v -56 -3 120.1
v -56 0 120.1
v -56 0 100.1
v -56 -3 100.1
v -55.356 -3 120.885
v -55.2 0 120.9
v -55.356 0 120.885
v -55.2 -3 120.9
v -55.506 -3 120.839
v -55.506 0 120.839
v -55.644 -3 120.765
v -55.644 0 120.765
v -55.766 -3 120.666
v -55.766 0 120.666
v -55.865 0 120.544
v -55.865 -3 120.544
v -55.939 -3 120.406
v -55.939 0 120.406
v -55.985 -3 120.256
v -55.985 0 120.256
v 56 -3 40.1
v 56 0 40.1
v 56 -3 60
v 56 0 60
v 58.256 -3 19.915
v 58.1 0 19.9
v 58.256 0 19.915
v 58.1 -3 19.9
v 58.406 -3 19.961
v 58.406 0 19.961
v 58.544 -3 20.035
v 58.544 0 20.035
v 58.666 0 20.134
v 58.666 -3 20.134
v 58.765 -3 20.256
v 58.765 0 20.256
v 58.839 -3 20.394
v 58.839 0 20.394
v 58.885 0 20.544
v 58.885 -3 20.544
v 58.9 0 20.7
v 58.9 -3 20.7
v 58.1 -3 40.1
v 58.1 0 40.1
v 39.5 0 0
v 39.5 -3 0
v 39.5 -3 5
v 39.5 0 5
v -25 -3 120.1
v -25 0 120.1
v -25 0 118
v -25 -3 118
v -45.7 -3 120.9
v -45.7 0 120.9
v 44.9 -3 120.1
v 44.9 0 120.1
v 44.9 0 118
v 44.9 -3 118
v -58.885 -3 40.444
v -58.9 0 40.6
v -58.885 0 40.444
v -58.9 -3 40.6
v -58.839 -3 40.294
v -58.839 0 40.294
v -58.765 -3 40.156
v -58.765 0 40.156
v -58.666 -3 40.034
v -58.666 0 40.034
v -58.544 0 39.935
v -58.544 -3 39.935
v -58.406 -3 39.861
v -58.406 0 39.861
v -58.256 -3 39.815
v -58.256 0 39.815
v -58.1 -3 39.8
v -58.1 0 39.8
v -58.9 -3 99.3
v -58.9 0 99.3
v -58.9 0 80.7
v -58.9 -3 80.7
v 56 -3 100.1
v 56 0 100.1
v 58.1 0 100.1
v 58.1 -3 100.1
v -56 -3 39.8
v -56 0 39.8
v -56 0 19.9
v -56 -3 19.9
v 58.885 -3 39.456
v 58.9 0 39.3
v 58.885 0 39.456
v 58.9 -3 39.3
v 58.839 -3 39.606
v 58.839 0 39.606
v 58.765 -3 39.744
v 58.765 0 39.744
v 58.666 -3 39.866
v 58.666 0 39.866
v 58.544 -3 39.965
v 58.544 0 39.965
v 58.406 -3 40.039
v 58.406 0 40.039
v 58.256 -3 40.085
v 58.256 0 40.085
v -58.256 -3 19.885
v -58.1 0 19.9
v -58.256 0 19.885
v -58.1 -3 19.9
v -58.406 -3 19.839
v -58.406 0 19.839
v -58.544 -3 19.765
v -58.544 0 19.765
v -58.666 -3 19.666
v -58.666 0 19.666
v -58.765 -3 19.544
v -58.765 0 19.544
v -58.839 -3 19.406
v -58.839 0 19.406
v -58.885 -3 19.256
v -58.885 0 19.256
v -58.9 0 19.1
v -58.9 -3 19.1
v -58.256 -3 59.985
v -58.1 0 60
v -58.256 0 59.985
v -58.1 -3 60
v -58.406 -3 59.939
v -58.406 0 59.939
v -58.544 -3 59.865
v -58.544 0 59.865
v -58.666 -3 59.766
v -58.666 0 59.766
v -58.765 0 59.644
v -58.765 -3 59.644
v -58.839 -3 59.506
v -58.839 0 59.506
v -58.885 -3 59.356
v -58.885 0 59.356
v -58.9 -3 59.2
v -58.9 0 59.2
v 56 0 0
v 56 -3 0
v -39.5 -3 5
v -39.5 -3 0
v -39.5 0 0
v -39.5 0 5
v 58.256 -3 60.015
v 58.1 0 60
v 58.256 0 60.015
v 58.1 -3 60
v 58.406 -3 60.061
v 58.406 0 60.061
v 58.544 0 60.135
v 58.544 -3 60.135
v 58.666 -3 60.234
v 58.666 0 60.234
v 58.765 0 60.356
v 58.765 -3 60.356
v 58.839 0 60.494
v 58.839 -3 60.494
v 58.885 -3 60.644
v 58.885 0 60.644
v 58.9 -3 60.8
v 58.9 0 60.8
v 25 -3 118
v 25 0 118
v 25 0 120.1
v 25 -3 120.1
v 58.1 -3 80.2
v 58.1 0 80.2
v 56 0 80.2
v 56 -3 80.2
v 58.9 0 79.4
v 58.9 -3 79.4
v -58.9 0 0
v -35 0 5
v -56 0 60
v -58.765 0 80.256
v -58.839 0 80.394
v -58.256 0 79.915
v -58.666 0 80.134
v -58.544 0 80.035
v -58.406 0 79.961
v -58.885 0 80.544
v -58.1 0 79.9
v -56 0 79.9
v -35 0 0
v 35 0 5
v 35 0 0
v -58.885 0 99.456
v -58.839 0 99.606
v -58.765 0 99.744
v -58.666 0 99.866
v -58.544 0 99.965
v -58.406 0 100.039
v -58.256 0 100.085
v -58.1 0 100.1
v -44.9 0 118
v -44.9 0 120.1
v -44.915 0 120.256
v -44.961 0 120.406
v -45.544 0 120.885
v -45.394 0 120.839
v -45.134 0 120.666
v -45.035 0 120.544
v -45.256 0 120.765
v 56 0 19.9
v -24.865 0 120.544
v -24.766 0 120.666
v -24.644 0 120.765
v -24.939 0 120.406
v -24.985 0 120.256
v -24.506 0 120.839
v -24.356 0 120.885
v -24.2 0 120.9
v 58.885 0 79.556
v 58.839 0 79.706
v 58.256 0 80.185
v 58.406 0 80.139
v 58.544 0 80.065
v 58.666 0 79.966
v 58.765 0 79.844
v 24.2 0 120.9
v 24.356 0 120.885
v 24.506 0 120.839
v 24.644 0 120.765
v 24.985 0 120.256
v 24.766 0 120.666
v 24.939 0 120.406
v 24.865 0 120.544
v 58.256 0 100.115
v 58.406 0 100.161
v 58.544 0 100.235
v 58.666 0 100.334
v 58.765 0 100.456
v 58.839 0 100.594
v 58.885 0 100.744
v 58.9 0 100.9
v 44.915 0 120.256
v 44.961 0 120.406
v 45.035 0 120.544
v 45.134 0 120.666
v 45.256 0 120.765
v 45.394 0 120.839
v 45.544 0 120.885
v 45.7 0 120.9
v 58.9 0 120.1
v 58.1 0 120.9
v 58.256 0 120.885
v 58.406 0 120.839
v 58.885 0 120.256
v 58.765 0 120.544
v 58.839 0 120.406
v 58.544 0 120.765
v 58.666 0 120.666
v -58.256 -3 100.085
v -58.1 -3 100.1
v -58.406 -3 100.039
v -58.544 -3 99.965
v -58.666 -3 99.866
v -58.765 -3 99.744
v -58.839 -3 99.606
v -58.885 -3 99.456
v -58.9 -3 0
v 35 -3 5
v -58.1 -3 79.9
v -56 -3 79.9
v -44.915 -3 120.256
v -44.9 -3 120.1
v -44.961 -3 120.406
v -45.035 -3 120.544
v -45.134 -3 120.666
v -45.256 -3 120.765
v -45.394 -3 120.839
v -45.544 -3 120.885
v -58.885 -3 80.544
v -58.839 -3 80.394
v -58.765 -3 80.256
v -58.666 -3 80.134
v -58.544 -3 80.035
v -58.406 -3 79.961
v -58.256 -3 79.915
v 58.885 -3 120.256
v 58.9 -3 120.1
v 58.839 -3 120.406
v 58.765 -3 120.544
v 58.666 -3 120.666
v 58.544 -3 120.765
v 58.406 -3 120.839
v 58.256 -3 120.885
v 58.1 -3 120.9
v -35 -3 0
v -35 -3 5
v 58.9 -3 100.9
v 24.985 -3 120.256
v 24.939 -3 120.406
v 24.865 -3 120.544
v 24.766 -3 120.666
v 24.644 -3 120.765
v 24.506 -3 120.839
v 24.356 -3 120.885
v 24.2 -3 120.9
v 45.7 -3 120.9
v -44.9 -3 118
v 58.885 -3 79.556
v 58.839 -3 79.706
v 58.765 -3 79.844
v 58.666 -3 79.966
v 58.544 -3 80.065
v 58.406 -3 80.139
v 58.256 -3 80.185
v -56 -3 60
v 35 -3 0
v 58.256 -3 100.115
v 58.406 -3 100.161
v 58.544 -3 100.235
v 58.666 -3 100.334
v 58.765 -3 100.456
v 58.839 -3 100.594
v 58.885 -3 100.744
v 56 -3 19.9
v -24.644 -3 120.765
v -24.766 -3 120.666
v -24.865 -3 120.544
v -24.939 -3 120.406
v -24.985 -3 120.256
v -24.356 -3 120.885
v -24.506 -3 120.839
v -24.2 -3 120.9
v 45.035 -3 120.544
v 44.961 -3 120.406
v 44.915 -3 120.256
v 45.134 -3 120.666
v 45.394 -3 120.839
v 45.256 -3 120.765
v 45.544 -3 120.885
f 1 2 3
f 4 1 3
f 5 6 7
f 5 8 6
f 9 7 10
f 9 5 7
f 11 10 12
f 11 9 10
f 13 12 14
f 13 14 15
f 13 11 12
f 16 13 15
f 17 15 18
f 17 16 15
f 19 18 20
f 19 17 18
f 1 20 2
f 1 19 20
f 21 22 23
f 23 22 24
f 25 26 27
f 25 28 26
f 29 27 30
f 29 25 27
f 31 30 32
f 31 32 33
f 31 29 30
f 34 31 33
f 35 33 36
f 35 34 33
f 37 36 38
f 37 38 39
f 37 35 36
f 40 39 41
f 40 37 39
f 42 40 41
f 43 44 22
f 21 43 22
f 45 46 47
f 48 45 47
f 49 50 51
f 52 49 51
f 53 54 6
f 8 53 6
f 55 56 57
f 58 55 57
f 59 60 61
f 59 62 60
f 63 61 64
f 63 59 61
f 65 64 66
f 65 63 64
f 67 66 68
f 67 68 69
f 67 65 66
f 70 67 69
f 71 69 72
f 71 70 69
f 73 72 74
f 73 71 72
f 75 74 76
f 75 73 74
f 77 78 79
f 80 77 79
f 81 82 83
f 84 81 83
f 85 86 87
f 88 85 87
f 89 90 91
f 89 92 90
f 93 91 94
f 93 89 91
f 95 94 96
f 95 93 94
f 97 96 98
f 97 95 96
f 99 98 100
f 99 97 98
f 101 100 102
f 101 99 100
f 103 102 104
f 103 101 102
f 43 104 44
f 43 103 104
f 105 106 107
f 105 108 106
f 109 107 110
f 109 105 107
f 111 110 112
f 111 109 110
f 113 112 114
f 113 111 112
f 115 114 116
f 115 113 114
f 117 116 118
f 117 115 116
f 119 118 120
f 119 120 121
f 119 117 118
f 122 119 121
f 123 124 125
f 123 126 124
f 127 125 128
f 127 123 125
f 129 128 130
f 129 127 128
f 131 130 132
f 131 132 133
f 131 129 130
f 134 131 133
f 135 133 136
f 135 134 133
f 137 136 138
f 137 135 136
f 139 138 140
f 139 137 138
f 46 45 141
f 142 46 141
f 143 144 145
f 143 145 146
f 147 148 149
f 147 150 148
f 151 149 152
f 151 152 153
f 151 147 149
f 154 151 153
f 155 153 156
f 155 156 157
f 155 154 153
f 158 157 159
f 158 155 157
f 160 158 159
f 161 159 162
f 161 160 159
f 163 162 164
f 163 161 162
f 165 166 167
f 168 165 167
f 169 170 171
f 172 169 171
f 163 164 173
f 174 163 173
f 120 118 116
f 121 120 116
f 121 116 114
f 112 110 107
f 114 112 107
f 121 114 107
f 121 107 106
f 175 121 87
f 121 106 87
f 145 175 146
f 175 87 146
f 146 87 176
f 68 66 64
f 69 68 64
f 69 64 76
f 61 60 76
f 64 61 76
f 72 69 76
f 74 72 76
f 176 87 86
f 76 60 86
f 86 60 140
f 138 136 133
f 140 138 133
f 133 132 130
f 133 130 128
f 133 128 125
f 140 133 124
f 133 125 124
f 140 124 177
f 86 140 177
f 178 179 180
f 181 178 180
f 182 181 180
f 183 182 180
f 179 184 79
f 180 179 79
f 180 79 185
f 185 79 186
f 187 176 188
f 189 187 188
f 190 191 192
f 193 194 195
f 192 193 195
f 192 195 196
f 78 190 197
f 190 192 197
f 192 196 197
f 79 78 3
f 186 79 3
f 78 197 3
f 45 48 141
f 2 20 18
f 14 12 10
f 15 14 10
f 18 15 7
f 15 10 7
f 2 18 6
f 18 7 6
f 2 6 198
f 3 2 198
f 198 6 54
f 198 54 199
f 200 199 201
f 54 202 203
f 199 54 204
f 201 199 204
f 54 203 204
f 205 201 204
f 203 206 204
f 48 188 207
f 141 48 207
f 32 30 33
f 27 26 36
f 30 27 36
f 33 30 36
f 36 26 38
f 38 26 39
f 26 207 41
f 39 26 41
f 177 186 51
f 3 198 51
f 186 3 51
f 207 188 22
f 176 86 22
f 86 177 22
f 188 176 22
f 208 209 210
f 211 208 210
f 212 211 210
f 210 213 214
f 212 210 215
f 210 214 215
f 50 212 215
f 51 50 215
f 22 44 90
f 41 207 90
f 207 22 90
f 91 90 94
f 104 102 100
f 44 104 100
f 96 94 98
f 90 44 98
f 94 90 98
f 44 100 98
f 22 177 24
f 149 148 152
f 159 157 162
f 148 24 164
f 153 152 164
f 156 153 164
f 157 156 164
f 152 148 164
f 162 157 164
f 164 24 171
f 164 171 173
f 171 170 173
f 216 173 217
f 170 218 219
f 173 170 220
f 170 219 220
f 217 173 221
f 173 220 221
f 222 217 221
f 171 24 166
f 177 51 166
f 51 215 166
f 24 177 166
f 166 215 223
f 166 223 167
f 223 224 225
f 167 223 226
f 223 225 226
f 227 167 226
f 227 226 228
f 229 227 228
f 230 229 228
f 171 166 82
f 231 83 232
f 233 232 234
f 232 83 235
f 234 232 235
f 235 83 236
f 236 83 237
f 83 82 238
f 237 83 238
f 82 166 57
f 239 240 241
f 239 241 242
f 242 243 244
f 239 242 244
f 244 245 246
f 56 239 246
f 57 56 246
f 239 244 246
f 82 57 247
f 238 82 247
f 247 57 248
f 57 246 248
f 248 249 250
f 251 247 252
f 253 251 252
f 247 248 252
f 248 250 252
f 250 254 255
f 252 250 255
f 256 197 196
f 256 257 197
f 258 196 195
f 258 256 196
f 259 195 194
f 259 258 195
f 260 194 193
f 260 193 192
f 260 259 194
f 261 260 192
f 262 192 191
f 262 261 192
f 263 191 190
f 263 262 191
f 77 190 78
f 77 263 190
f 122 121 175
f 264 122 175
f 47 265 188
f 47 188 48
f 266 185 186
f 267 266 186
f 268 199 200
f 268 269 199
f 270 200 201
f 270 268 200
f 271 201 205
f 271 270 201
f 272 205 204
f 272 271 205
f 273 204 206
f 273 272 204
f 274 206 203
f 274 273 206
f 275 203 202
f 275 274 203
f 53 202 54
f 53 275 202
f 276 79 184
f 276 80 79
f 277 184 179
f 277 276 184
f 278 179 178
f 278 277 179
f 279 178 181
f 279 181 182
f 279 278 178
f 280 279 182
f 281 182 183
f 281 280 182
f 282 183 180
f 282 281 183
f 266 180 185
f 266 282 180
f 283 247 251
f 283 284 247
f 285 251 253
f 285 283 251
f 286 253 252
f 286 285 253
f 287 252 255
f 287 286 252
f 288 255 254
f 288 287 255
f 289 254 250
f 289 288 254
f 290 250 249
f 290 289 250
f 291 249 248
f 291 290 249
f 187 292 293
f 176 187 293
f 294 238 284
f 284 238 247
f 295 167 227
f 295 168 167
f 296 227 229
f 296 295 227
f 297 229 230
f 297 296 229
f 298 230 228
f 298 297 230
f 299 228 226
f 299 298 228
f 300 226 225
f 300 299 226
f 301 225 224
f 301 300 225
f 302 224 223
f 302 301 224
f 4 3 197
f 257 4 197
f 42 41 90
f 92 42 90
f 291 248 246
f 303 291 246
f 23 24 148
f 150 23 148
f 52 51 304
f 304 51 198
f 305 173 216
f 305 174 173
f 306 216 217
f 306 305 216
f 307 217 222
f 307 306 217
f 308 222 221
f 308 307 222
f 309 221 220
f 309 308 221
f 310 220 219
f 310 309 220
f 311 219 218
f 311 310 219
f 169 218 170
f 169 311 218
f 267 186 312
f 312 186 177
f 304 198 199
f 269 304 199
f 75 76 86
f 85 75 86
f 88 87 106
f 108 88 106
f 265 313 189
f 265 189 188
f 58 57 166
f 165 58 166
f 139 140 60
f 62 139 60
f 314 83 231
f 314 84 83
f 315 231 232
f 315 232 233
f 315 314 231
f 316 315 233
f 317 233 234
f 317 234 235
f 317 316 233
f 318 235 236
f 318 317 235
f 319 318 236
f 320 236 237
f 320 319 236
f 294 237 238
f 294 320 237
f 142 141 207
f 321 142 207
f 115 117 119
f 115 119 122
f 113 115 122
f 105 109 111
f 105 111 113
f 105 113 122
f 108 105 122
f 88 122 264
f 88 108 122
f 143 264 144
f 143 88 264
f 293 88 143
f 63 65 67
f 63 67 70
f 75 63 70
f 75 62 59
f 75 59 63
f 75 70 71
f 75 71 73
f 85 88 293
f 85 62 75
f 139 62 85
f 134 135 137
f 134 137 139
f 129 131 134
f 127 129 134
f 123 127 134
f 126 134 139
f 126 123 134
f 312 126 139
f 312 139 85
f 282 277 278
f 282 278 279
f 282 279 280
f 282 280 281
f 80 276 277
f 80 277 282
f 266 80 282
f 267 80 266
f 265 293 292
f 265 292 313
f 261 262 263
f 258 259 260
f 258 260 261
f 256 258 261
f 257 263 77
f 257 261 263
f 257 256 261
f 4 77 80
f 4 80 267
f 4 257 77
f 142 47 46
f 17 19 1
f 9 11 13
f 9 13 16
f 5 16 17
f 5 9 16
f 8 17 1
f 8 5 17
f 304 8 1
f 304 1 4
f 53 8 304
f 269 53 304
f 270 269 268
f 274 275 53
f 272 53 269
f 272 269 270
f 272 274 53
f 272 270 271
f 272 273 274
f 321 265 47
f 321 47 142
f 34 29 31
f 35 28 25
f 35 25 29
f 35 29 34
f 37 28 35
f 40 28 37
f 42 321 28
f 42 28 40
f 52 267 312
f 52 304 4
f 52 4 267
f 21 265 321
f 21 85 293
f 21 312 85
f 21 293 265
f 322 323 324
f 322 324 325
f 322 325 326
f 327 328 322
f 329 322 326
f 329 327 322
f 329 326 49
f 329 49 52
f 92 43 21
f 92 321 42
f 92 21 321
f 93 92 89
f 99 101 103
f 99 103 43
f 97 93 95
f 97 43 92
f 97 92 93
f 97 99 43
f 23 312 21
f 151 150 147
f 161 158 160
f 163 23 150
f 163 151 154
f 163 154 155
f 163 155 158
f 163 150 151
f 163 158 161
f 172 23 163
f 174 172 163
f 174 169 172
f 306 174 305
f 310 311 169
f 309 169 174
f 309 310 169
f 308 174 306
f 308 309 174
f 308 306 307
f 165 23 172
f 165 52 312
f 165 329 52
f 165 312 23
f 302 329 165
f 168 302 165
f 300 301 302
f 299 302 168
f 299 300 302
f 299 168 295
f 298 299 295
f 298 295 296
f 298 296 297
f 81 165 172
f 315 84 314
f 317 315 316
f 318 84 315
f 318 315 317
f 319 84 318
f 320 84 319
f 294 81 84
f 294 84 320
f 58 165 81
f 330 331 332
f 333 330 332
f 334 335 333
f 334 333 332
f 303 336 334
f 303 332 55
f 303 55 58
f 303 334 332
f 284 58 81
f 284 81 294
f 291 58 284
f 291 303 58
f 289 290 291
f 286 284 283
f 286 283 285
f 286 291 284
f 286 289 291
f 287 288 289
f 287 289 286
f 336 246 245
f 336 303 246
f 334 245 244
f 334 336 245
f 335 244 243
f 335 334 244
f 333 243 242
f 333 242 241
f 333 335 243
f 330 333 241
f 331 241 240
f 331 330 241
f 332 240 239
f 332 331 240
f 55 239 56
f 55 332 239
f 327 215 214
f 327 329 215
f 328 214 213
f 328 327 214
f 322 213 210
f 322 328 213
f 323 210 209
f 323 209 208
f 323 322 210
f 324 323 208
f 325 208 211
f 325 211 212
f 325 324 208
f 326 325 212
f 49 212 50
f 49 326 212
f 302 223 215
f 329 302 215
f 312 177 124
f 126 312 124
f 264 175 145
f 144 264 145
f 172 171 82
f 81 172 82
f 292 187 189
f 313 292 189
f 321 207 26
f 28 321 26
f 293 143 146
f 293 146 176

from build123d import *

# Parameters (mm, degrees)
F1_DEPTH = 3
F2_R     = 0.8
F3_W     = 4.5
F3_H     = 5
F4_DEPTH = 3.001


with BuildPart() as f1:
    # F0 (on Front) → F1 (new body)
    with BuildSketch(Plane.XZ):
        Polygon((-58.9, 0), (56, 0), (56, 19.9), (58.9, 19.9), (58.9, 40.1), (56, 40.1), (56, 60), (58.9, 60), (58.9, 80.2), (56, 80.2), (56, 100.1), (58.9, 100.1), (58.9, 120.9), (44.9, 120.9), (44.9, 118), (25, 118), (25, 120.9), (-25, 120.9), (-25, 118), (-44.9, 118), (-44.9, 120.9), (-56, 120.9), (-56, 100.1), (-58.9, 100.1), (-58.9, 79.9), (-56, 79.9), (-56, 60), (-58.9, 60), (-58.9, 39.8), (-56, 39.8), (-56, 19.9), (-58.9, 19.9), align=None)
    extrude(amount=F1_DEPTH)

    # F2
    f2_edges = [f1.edges().sort_by_distance(p)[0] for p in [
        (58.9, -1.5, 100.1),
        (58.9, -1.5, 80.2),
        (58.9, -1.5, 60),
        (58.9, -1.5, 40.1),
        (58.9, -1.5, 19.9),
        (-58.9, -1.5, 19.9),
        (-58.9, -1.5, 39.8),
        (-58.9, -1.5, 60),
        (-58.9, -1.5, 79.9),
        (-58.9, -1.5, 100.1),
        (-56, -1.5, 120.9),
        (-44.9, -1.5, 120.9),
        (-25, -1.5, 120.9),
        (25, -1.5, 120.9),
        (44.9, -1.5, 120.9),
        (58.9, -1.5, 120.9),
    ]]
    fillet(f2_edges, radius=F2_R)

    # F3 (on face) → F4 (cut, through all)
    with BuildSketch(Plane.XZ.offset(3)):
        with Locations((-37.25, 2.5)):
            Rectangle(F3_W, F3_H)
        with Locations((37.25, 2.5)):
            Rectangle(F3_W, F3_H)
    extrude(amount=-F4_DEPTH, mode=Mode.SUBTRACT)


solid = f1.part
